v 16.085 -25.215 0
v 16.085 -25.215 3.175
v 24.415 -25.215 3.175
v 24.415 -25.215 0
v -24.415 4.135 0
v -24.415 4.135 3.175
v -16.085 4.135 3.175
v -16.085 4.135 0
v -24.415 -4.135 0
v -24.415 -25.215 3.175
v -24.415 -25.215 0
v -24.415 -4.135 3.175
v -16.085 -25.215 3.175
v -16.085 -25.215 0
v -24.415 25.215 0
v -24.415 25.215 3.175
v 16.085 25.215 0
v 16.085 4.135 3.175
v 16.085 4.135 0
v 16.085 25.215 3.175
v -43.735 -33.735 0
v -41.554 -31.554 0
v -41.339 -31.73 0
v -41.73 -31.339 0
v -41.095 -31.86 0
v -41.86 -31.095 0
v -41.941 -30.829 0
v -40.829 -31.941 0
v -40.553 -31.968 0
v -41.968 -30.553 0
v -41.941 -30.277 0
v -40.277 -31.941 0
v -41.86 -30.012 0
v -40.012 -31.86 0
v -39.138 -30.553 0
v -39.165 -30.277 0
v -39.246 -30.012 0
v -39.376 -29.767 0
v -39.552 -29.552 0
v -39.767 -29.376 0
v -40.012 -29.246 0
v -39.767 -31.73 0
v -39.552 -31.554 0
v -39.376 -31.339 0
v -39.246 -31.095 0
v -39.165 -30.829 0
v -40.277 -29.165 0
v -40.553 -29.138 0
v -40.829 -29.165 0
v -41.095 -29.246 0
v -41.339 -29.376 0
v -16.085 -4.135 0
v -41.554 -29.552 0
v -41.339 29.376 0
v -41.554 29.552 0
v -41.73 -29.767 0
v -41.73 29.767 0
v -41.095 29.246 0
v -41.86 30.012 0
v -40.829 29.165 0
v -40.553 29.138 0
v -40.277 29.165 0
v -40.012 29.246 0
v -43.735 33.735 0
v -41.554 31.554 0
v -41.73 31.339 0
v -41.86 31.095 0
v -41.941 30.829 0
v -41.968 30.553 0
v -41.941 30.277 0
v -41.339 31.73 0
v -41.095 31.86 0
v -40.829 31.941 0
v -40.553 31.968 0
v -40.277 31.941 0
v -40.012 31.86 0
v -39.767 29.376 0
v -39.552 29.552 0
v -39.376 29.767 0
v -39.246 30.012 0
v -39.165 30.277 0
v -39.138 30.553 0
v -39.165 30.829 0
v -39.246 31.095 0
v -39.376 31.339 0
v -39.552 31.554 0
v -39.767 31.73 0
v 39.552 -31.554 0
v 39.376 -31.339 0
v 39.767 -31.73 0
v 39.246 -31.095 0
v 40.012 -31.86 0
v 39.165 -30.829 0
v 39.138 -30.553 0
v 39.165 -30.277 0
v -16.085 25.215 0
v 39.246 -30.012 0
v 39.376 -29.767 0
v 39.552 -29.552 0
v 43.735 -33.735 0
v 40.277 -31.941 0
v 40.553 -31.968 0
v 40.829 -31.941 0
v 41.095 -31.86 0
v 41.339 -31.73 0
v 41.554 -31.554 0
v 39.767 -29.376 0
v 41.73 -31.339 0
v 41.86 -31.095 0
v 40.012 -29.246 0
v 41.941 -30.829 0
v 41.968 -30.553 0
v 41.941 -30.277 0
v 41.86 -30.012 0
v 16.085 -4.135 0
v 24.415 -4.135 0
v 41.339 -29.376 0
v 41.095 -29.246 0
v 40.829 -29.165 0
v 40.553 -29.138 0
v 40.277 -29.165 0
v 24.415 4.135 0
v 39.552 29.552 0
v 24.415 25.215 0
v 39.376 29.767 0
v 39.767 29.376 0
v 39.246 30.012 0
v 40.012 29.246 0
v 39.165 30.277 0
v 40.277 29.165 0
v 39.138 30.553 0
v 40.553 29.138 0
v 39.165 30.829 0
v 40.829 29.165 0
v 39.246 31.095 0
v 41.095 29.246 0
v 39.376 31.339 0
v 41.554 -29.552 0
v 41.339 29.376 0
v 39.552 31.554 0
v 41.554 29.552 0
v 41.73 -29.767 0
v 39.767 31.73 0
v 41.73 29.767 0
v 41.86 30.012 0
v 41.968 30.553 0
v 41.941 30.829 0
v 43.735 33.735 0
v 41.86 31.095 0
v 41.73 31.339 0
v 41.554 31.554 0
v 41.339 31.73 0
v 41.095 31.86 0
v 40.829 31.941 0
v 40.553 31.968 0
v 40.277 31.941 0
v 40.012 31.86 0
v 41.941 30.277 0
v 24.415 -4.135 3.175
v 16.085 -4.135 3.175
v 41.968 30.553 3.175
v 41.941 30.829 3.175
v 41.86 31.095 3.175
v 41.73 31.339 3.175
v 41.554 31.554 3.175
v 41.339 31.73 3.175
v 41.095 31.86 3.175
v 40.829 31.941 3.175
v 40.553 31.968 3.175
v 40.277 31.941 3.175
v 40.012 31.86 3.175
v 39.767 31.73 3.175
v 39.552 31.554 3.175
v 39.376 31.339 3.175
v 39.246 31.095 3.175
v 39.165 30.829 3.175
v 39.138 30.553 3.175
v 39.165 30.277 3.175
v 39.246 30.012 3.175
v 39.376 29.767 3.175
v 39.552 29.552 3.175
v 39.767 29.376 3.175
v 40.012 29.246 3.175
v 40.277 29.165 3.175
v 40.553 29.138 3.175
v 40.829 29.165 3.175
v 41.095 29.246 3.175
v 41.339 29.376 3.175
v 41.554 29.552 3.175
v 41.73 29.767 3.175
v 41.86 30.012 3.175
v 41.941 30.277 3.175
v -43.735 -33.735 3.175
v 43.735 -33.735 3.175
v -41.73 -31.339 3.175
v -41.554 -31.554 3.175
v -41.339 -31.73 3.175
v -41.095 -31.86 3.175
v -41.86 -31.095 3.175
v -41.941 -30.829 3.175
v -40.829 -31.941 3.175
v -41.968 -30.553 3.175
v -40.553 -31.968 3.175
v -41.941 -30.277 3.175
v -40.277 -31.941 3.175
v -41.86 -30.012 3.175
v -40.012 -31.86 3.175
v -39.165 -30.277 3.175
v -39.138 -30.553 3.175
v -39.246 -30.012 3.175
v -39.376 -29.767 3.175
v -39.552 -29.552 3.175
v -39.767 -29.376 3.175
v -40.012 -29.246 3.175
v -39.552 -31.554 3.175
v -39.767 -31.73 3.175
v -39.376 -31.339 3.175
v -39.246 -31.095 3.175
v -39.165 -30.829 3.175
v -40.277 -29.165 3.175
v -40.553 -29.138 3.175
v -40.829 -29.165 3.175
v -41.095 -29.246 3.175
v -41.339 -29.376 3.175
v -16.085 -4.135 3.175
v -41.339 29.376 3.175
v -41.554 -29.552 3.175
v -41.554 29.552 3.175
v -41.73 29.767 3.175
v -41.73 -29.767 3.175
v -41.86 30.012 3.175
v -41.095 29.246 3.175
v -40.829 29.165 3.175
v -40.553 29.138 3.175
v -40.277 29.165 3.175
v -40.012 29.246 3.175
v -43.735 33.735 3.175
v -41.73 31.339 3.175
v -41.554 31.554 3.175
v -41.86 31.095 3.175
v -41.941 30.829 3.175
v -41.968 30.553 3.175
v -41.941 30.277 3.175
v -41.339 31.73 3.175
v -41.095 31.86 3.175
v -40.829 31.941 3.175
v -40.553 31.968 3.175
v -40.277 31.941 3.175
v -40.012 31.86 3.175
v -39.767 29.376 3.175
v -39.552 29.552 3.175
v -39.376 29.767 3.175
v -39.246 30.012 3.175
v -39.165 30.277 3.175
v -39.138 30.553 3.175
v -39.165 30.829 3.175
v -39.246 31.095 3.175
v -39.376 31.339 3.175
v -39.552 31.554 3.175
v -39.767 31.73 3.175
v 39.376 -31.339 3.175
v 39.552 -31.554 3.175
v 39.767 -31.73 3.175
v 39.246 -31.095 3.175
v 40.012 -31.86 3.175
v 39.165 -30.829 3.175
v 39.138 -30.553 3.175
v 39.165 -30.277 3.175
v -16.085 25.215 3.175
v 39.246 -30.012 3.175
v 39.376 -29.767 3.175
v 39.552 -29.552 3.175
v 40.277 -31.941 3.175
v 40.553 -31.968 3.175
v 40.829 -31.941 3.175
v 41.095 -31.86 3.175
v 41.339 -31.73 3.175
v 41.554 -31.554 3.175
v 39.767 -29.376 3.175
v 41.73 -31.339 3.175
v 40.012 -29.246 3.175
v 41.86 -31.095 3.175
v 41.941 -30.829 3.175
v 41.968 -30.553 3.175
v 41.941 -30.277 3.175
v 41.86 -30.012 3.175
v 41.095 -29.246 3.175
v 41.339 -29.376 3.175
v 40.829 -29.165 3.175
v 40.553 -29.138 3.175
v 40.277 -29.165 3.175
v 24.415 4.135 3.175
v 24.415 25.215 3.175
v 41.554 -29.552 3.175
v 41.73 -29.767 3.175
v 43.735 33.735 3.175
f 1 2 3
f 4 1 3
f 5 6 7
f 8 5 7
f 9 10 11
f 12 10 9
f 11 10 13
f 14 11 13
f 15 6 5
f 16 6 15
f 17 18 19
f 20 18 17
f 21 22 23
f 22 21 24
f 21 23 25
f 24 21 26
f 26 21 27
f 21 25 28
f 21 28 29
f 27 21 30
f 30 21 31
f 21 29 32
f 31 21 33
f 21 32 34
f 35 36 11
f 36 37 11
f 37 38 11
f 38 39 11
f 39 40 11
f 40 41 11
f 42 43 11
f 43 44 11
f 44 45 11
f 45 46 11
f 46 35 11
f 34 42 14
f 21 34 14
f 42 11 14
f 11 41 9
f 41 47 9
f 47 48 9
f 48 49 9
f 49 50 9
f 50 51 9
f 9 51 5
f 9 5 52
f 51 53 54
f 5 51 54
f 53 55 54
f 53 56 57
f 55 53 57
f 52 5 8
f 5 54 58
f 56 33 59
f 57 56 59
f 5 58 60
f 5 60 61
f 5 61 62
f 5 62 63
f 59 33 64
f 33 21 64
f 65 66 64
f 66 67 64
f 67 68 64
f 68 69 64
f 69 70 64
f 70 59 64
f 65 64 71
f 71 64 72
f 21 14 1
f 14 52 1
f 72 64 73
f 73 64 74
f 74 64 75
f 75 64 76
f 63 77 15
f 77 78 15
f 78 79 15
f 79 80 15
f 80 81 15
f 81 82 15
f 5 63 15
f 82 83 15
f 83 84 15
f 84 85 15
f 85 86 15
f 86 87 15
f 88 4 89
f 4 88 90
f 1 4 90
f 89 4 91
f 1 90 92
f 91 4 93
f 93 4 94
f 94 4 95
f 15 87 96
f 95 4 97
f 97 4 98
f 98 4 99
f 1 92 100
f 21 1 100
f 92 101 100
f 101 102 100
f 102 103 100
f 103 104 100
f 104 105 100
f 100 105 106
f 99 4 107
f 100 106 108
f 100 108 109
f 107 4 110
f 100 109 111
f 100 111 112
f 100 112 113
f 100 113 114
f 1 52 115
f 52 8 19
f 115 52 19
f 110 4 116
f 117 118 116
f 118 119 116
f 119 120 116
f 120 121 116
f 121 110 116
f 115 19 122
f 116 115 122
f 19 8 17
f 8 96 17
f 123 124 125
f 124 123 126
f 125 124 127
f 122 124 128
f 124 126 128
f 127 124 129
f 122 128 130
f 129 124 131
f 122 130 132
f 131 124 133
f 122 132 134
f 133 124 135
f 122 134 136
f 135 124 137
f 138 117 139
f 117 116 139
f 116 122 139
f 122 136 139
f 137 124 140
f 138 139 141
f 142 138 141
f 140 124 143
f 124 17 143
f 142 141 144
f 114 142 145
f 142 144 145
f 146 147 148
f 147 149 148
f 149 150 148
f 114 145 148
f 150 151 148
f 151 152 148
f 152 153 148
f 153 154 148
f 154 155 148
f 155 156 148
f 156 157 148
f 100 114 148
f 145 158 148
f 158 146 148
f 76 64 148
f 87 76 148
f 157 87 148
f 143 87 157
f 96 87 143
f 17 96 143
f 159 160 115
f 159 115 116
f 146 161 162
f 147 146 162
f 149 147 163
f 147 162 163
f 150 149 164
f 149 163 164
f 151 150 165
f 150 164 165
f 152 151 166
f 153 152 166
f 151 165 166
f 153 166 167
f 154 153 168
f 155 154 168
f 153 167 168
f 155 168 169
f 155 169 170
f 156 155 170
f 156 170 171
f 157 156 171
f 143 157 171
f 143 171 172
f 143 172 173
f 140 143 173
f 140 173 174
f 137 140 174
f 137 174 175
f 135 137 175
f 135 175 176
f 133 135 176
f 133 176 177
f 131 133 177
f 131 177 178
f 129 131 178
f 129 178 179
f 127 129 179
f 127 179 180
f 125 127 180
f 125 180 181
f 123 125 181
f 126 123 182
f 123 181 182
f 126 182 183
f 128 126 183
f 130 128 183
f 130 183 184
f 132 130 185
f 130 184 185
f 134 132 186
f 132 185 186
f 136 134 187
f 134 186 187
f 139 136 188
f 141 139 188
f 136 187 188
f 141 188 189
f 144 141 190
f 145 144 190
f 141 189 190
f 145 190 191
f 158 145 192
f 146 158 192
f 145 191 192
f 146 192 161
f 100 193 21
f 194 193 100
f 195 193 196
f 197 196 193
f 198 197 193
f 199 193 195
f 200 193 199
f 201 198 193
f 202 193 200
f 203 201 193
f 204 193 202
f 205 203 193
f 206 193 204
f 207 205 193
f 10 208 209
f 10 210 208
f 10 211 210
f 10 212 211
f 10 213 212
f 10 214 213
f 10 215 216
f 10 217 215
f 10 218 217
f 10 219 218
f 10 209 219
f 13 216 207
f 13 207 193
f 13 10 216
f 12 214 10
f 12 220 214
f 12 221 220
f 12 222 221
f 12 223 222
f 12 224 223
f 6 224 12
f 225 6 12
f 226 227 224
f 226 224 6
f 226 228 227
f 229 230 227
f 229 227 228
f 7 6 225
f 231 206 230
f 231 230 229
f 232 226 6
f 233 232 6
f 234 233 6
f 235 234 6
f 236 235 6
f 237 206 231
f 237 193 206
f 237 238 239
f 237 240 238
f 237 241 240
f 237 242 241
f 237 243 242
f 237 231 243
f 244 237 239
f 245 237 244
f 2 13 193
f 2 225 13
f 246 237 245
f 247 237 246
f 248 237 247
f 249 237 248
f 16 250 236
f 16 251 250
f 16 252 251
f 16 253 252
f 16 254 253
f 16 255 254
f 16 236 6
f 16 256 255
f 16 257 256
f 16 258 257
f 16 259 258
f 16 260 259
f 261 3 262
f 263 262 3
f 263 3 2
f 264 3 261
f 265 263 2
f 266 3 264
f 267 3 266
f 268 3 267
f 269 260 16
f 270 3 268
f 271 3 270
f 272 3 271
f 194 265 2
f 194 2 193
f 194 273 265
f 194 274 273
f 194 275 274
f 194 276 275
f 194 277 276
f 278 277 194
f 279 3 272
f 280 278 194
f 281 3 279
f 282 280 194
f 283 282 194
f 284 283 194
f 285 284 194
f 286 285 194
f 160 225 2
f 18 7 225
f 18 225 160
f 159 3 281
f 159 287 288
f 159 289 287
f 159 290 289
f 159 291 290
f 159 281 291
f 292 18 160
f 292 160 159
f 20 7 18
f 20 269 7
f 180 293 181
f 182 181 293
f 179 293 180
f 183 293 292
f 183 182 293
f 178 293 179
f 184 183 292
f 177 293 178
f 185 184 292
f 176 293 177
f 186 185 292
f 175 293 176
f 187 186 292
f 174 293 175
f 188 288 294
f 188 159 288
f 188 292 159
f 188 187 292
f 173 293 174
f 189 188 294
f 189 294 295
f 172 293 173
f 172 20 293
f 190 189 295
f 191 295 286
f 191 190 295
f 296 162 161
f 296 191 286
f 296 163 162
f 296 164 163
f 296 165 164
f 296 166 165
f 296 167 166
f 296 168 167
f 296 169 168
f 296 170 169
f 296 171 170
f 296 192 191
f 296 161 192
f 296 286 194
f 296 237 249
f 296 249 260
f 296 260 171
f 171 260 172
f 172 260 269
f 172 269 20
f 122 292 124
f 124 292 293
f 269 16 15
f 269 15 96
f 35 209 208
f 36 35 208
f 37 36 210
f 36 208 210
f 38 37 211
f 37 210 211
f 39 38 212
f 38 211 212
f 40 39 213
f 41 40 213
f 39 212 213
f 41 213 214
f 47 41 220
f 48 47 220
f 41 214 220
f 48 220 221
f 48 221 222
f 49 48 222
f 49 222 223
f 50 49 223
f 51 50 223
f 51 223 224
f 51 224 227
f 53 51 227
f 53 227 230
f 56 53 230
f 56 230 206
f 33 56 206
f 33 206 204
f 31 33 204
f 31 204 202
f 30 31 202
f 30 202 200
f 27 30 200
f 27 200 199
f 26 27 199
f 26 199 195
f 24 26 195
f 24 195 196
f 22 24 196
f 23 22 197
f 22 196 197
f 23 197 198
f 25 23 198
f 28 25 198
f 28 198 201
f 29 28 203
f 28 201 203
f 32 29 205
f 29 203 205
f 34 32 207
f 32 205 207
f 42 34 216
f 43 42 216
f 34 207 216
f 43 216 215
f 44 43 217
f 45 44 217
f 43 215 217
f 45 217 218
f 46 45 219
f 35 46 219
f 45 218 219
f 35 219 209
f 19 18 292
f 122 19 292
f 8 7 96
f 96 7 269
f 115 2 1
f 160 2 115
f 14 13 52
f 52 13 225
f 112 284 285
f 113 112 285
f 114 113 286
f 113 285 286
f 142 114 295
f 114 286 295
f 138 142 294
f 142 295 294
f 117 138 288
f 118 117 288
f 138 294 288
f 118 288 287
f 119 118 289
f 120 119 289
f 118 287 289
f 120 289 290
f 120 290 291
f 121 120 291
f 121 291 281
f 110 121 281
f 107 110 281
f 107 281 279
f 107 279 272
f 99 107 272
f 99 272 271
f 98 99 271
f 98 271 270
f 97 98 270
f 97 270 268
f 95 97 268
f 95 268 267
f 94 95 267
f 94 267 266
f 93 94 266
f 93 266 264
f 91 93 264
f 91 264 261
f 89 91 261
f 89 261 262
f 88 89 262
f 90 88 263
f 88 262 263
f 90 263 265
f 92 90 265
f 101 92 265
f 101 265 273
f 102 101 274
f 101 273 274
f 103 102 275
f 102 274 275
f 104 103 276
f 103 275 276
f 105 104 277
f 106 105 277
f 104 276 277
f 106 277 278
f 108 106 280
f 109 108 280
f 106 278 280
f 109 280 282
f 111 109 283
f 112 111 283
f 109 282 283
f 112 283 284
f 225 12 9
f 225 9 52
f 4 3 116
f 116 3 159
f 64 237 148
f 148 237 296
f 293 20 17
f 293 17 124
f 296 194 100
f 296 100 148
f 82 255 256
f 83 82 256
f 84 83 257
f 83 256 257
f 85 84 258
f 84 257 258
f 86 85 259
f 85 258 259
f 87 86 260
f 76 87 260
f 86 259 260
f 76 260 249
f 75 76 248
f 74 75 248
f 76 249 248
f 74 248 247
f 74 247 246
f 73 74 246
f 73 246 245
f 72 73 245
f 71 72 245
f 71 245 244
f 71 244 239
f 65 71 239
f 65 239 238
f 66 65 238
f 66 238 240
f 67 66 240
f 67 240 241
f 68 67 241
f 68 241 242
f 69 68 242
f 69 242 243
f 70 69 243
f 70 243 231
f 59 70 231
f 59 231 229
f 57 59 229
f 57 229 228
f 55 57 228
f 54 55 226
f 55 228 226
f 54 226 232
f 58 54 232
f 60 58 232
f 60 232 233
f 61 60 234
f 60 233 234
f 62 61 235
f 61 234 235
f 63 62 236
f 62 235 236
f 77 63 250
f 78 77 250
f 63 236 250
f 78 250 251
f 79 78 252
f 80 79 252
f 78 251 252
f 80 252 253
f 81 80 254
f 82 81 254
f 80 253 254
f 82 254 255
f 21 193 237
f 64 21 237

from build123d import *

# Parameters (mm, degrees)
SKETCH1_W           = 100
SKETCH1_H           = 80
BOSS_EXTRUDE1_DEPTH = 3.175
SKETCH3_W           = 100.17
SKETCH3_H           = 80.17
SKETCH3_W_2         = 87.47
SKETCH3_H_2         = 67.47
CUT_EXTRUDE2_DEPTH  = 10
SKETCH4_R           = 1.415
CUT_EXTRUDE3_DEPTH  = 10
SKETCH2_W           = 8.33
SKETCH2_H           = 21.08
CUT_EXTRUDE4_DEPTH  = 10


with BuildPart() as part:
    # Sketch1 → Boss-Extrude1 (new body)
    with BuildSketch(Plane.XY):
        Rectangle(SKETCH1_W, SKETCH1_H)
    extrude(amount=BOSS_EXTRUDE1_DEPTH)

    # Sketch3 → Cut-Extrude2 (cut)
    with BuildSketch(Plane.XY.offset(3.175)):
        Rectangle(SKETCH3_W, SKETCH3_H)
        Rectangle(SKETCH3_W_2, SKETCH3_H_2, mode=Mode.SUBTRACT)
    extrude(amount=-CUT_EXTRUDE2_DEPTH, mode=Mode.SUBTRACT)

    # Sketch4 → Cut-Extrude3 (cut)
    with BuildSketch(Plane.XY.offset(3.175)):
        with Locations((-40.553019485, 30.553019485)):
            Circle(SKETCH4_R)
        with Locations((40.553019485, 30.553019485)):
            Circle(SKETCH4_R)
        with Locations((40.553019485, -30.553019485)):
            Circle(SKETCH4_R)
        with Locations((-40.553019485, -30.553019485)):
            Circle(SKETCH4_R)
    extrude(amount=-CUT_EXTRUDE3_DEPTH, mode=Mode.SUBTRACT)

    # Sketch2 → Cut-Extrude4 (cut)
    with BuildSketch(Plane.XY.offset(3.175)):
        with Locations((-20.25, 14.675)):
            Rectangle(SKETCH2_W, SKETCH2_H)
        with Locations((20.25, 14.675)):
            Rectangle(SKETCH2_W, SKETCH2_H)
        with Locations((-20.25, -14.675)):
            Rectangle(SKETCH2_W, SKETCH2_H)
        with Locations((20.25, -14.675)):
            Rectangle(SKETCH2_W, SKETCH2_H)
    extrude(amount=-CUT_EXTRUDE4_DEPTH, mode=Mode.SUBTRACT)


solid = part.part
